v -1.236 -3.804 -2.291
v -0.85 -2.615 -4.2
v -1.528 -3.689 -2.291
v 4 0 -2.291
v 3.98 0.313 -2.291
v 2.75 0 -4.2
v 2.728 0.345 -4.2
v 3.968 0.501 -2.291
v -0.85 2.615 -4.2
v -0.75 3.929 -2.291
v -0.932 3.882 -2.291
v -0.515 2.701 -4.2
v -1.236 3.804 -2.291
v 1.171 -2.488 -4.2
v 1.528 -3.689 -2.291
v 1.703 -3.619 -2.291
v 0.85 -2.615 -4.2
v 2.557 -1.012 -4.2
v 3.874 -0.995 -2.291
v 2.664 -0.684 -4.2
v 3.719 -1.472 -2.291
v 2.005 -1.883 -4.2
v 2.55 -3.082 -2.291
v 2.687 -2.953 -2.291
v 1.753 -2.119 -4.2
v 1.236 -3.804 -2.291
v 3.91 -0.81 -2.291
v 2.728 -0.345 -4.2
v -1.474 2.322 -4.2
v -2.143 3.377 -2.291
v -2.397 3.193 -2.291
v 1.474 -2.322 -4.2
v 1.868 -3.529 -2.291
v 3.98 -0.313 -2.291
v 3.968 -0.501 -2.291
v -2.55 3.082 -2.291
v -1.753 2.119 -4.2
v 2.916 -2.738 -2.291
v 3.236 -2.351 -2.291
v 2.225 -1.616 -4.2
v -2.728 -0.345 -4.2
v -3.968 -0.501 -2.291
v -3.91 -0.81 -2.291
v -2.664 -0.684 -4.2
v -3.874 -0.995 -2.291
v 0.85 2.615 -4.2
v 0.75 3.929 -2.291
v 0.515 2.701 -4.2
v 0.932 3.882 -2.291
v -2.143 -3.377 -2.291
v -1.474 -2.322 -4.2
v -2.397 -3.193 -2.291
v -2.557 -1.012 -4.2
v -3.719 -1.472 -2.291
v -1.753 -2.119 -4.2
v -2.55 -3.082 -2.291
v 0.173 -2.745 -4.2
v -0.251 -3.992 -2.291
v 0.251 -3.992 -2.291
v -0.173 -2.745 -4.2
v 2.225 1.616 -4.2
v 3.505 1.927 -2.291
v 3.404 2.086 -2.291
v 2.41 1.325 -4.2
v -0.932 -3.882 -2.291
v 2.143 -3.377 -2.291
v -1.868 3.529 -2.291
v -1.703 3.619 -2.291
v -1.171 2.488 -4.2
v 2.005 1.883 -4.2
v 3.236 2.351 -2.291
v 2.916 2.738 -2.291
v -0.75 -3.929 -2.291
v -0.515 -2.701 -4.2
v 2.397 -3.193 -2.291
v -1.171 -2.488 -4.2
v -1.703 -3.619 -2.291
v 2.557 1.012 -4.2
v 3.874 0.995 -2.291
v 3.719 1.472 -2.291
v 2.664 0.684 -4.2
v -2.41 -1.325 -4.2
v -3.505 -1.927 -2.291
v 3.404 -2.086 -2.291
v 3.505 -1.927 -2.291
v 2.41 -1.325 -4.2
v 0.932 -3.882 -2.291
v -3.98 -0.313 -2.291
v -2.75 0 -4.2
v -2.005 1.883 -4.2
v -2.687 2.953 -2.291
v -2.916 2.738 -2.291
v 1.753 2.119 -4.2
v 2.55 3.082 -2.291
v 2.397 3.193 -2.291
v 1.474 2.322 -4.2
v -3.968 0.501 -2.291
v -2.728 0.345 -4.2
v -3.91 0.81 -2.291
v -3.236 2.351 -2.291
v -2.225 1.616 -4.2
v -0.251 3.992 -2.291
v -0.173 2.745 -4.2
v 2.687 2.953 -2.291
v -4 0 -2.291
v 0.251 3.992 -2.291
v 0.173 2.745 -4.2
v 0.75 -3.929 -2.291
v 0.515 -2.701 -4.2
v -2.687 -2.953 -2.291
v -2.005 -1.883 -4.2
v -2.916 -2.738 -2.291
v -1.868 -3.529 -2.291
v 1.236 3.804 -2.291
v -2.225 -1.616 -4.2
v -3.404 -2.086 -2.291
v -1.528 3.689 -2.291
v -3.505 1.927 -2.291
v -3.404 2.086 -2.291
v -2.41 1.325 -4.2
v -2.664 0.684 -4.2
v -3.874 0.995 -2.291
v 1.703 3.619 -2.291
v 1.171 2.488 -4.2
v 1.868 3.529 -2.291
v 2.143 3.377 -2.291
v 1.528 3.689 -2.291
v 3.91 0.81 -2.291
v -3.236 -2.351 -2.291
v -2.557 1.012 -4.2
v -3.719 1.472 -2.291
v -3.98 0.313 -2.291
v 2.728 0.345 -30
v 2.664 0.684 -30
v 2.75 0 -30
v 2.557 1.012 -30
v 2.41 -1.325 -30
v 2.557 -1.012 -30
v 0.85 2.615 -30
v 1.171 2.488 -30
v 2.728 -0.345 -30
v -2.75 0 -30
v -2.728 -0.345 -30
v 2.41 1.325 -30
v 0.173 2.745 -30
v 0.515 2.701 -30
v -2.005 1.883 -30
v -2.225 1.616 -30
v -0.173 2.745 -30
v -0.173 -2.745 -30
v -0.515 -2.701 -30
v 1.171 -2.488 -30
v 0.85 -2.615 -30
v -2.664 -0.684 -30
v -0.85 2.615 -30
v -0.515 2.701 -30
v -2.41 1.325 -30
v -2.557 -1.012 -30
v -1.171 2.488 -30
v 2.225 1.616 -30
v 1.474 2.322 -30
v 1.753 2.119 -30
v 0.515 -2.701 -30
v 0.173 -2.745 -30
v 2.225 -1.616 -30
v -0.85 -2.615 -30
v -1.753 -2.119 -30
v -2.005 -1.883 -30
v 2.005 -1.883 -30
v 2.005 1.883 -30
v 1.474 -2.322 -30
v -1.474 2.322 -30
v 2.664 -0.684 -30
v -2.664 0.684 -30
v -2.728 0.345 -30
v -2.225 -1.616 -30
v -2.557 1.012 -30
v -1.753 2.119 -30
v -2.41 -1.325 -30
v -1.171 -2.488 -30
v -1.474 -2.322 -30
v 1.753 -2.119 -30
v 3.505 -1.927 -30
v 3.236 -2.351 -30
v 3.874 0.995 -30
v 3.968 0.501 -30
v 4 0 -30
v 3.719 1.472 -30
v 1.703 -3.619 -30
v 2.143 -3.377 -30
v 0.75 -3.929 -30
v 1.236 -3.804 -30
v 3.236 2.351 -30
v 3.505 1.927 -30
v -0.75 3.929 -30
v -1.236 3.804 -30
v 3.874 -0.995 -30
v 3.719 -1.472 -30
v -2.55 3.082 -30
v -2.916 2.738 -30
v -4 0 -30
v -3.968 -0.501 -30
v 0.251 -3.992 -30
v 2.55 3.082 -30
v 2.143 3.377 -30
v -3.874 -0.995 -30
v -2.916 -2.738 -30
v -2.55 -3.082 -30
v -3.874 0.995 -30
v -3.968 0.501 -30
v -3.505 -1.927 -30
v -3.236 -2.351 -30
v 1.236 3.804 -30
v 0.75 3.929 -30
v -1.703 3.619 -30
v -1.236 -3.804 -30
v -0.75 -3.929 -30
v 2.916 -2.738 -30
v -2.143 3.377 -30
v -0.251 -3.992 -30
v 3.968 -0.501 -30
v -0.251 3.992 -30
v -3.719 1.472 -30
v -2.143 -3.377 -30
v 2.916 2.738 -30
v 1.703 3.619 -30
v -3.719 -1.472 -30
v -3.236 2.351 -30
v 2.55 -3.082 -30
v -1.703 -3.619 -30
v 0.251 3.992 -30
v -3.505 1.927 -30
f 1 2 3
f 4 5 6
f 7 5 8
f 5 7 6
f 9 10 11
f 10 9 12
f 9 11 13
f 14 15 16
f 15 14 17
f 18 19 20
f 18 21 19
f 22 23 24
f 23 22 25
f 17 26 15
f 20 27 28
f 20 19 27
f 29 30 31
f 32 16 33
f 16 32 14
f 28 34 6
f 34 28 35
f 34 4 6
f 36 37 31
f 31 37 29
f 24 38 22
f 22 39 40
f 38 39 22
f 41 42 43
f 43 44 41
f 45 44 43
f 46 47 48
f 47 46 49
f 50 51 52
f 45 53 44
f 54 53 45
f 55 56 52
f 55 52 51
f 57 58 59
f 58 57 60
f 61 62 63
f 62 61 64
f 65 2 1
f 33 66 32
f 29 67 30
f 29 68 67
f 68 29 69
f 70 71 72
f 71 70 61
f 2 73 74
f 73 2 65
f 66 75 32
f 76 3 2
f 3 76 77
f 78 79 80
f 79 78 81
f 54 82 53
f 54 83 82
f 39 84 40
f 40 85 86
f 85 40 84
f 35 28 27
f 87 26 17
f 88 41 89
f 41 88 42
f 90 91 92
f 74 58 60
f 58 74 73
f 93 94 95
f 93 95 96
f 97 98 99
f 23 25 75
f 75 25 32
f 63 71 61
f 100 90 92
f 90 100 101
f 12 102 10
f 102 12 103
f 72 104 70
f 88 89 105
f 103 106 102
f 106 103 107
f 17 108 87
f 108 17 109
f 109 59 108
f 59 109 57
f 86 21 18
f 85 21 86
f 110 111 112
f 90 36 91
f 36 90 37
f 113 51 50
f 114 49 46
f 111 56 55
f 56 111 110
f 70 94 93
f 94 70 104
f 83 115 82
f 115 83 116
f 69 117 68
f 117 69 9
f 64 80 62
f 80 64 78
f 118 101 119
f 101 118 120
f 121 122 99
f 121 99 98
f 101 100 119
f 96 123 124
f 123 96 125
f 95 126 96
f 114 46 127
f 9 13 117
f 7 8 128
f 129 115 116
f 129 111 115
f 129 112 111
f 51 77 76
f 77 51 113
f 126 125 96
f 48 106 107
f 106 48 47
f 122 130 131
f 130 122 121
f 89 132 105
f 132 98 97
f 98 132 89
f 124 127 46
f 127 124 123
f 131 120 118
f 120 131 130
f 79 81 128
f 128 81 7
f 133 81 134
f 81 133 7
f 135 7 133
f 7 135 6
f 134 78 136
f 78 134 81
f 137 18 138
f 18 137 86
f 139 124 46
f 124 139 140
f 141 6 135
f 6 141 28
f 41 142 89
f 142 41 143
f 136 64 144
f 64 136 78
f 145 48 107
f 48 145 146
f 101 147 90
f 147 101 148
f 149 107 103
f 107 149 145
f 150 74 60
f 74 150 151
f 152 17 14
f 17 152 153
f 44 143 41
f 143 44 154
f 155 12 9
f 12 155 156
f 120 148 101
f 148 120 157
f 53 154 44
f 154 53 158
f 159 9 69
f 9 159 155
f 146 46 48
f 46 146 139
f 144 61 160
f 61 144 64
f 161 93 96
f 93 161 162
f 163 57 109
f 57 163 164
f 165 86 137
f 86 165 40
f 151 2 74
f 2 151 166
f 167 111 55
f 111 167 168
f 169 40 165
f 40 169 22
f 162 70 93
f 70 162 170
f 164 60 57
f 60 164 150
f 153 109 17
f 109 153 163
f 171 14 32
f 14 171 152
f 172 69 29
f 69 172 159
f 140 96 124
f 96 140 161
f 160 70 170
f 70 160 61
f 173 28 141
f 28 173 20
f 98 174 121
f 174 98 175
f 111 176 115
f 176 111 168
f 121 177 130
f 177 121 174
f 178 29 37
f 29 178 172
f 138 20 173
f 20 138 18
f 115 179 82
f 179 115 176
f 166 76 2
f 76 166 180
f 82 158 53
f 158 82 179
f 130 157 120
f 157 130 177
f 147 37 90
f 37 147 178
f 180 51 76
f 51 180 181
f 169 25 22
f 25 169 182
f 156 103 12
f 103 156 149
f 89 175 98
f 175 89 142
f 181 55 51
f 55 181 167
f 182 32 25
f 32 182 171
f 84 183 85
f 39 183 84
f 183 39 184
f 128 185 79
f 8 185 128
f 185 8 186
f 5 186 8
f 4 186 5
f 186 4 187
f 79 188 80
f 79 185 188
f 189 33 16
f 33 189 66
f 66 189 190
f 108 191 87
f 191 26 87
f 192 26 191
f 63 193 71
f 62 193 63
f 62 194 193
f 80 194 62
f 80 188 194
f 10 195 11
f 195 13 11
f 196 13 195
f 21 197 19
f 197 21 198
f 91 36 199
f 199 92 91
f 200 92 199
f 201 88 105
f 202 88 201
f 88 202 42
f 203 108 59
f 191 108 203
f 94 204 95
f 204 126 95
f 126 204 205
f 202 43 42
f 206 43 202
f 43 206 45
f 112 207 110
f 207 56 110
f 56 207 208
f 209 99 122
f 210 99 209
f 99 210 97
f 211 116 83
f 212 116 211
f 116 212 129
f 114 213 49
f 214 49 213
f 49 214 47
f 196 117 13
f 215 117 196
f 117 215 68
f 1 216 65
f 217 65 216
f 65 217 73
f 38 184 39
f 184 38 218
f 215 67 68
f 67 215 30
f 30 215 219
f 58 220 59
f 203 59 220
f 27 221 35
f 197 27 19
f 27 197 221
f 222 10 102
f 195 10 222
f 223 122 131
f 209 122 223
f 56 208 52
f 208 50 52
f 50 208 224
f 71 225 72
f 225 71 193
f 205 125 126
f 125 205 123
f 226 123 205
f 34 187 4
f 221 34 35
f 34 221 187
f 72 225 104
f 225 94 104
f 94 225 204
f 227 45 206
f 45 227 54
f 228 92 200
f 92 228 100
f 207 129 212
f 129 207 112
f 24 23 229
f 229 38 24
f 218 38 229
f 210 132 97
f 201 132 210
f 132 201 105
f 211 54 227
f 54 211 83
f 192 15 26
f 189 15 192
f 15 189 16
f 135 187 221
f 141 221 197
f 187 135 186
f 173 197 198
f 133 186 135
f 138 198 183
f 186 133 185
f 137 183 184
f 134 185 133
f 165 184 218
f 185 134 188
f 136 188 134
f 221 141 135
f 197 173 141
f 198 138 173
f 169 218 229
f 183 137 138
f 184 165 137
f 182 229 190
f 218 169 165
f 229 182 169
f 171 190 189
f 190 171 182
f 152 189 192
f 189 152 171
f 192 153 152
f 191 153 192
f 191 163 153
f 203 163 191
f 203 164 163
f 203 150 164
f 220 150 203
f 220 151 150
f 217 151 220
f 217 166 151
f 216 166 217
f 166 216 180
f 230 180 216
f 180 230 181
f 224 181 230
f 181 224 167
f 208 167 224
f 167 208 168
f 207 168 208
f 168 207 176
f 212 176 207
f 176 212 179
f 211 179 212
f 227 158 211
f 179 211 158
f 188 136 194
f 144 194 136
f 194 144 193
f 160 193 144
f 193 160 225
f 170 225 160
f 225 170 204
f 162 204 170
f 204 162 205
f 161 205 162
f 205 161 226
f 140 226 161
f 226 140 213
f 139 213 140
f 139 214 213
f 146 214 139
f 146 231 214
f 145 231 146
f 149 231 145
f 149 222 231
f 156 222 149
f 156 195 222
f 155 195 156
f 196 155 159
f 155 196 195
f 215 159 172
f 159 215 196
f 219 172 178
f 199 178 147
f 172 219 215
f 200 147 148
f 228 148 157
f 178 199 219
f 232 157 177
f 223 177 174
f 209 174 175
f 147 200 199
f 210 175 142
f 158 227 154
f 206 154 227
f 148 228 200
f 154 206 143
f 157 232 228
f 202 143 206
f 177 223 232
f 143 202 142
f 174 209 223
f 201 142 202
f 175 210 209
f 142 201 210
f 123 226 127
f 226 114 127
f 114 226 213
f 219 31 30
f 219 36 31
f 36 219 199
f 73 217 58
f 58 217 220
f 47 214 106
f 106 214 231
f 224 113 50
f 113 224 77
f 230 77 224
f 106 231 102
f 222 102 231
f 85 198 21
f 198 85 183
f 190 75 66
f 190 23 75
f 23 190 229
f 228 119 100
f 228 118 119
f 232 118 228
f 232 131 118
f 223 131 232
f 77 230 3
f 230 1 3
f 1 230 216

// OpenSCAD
$fn = 50;

difference() {
	union() {
		translate(v = [0, 0, -30.0]) {
			cylinder(h = 30, r = 4.0);
		}
	}
	union() {
		translate(v = [0, 0, 0]) {
			rotate(a = [0, 0, 0]) {
				difference() {
					union() {
						translate(v = [0, 0, -33.0]) {
							cylinder(h = 33, r = 2.25);
						}
						translate(v = [0, 0, -4.2]) {
							cylinder(h = 4.2, r1 = 2.75, r2 = 5.5);
						}
						translate(v = [0, 0, -33.0]) {
							cylinder(h = 33, r = 2.75);
						}
						translate(v = [0, 0, -33.0]) {
							cylinder(h = 33, r = 2.25);
						}
					}
					union();
				}
			}
		}
	}
}
